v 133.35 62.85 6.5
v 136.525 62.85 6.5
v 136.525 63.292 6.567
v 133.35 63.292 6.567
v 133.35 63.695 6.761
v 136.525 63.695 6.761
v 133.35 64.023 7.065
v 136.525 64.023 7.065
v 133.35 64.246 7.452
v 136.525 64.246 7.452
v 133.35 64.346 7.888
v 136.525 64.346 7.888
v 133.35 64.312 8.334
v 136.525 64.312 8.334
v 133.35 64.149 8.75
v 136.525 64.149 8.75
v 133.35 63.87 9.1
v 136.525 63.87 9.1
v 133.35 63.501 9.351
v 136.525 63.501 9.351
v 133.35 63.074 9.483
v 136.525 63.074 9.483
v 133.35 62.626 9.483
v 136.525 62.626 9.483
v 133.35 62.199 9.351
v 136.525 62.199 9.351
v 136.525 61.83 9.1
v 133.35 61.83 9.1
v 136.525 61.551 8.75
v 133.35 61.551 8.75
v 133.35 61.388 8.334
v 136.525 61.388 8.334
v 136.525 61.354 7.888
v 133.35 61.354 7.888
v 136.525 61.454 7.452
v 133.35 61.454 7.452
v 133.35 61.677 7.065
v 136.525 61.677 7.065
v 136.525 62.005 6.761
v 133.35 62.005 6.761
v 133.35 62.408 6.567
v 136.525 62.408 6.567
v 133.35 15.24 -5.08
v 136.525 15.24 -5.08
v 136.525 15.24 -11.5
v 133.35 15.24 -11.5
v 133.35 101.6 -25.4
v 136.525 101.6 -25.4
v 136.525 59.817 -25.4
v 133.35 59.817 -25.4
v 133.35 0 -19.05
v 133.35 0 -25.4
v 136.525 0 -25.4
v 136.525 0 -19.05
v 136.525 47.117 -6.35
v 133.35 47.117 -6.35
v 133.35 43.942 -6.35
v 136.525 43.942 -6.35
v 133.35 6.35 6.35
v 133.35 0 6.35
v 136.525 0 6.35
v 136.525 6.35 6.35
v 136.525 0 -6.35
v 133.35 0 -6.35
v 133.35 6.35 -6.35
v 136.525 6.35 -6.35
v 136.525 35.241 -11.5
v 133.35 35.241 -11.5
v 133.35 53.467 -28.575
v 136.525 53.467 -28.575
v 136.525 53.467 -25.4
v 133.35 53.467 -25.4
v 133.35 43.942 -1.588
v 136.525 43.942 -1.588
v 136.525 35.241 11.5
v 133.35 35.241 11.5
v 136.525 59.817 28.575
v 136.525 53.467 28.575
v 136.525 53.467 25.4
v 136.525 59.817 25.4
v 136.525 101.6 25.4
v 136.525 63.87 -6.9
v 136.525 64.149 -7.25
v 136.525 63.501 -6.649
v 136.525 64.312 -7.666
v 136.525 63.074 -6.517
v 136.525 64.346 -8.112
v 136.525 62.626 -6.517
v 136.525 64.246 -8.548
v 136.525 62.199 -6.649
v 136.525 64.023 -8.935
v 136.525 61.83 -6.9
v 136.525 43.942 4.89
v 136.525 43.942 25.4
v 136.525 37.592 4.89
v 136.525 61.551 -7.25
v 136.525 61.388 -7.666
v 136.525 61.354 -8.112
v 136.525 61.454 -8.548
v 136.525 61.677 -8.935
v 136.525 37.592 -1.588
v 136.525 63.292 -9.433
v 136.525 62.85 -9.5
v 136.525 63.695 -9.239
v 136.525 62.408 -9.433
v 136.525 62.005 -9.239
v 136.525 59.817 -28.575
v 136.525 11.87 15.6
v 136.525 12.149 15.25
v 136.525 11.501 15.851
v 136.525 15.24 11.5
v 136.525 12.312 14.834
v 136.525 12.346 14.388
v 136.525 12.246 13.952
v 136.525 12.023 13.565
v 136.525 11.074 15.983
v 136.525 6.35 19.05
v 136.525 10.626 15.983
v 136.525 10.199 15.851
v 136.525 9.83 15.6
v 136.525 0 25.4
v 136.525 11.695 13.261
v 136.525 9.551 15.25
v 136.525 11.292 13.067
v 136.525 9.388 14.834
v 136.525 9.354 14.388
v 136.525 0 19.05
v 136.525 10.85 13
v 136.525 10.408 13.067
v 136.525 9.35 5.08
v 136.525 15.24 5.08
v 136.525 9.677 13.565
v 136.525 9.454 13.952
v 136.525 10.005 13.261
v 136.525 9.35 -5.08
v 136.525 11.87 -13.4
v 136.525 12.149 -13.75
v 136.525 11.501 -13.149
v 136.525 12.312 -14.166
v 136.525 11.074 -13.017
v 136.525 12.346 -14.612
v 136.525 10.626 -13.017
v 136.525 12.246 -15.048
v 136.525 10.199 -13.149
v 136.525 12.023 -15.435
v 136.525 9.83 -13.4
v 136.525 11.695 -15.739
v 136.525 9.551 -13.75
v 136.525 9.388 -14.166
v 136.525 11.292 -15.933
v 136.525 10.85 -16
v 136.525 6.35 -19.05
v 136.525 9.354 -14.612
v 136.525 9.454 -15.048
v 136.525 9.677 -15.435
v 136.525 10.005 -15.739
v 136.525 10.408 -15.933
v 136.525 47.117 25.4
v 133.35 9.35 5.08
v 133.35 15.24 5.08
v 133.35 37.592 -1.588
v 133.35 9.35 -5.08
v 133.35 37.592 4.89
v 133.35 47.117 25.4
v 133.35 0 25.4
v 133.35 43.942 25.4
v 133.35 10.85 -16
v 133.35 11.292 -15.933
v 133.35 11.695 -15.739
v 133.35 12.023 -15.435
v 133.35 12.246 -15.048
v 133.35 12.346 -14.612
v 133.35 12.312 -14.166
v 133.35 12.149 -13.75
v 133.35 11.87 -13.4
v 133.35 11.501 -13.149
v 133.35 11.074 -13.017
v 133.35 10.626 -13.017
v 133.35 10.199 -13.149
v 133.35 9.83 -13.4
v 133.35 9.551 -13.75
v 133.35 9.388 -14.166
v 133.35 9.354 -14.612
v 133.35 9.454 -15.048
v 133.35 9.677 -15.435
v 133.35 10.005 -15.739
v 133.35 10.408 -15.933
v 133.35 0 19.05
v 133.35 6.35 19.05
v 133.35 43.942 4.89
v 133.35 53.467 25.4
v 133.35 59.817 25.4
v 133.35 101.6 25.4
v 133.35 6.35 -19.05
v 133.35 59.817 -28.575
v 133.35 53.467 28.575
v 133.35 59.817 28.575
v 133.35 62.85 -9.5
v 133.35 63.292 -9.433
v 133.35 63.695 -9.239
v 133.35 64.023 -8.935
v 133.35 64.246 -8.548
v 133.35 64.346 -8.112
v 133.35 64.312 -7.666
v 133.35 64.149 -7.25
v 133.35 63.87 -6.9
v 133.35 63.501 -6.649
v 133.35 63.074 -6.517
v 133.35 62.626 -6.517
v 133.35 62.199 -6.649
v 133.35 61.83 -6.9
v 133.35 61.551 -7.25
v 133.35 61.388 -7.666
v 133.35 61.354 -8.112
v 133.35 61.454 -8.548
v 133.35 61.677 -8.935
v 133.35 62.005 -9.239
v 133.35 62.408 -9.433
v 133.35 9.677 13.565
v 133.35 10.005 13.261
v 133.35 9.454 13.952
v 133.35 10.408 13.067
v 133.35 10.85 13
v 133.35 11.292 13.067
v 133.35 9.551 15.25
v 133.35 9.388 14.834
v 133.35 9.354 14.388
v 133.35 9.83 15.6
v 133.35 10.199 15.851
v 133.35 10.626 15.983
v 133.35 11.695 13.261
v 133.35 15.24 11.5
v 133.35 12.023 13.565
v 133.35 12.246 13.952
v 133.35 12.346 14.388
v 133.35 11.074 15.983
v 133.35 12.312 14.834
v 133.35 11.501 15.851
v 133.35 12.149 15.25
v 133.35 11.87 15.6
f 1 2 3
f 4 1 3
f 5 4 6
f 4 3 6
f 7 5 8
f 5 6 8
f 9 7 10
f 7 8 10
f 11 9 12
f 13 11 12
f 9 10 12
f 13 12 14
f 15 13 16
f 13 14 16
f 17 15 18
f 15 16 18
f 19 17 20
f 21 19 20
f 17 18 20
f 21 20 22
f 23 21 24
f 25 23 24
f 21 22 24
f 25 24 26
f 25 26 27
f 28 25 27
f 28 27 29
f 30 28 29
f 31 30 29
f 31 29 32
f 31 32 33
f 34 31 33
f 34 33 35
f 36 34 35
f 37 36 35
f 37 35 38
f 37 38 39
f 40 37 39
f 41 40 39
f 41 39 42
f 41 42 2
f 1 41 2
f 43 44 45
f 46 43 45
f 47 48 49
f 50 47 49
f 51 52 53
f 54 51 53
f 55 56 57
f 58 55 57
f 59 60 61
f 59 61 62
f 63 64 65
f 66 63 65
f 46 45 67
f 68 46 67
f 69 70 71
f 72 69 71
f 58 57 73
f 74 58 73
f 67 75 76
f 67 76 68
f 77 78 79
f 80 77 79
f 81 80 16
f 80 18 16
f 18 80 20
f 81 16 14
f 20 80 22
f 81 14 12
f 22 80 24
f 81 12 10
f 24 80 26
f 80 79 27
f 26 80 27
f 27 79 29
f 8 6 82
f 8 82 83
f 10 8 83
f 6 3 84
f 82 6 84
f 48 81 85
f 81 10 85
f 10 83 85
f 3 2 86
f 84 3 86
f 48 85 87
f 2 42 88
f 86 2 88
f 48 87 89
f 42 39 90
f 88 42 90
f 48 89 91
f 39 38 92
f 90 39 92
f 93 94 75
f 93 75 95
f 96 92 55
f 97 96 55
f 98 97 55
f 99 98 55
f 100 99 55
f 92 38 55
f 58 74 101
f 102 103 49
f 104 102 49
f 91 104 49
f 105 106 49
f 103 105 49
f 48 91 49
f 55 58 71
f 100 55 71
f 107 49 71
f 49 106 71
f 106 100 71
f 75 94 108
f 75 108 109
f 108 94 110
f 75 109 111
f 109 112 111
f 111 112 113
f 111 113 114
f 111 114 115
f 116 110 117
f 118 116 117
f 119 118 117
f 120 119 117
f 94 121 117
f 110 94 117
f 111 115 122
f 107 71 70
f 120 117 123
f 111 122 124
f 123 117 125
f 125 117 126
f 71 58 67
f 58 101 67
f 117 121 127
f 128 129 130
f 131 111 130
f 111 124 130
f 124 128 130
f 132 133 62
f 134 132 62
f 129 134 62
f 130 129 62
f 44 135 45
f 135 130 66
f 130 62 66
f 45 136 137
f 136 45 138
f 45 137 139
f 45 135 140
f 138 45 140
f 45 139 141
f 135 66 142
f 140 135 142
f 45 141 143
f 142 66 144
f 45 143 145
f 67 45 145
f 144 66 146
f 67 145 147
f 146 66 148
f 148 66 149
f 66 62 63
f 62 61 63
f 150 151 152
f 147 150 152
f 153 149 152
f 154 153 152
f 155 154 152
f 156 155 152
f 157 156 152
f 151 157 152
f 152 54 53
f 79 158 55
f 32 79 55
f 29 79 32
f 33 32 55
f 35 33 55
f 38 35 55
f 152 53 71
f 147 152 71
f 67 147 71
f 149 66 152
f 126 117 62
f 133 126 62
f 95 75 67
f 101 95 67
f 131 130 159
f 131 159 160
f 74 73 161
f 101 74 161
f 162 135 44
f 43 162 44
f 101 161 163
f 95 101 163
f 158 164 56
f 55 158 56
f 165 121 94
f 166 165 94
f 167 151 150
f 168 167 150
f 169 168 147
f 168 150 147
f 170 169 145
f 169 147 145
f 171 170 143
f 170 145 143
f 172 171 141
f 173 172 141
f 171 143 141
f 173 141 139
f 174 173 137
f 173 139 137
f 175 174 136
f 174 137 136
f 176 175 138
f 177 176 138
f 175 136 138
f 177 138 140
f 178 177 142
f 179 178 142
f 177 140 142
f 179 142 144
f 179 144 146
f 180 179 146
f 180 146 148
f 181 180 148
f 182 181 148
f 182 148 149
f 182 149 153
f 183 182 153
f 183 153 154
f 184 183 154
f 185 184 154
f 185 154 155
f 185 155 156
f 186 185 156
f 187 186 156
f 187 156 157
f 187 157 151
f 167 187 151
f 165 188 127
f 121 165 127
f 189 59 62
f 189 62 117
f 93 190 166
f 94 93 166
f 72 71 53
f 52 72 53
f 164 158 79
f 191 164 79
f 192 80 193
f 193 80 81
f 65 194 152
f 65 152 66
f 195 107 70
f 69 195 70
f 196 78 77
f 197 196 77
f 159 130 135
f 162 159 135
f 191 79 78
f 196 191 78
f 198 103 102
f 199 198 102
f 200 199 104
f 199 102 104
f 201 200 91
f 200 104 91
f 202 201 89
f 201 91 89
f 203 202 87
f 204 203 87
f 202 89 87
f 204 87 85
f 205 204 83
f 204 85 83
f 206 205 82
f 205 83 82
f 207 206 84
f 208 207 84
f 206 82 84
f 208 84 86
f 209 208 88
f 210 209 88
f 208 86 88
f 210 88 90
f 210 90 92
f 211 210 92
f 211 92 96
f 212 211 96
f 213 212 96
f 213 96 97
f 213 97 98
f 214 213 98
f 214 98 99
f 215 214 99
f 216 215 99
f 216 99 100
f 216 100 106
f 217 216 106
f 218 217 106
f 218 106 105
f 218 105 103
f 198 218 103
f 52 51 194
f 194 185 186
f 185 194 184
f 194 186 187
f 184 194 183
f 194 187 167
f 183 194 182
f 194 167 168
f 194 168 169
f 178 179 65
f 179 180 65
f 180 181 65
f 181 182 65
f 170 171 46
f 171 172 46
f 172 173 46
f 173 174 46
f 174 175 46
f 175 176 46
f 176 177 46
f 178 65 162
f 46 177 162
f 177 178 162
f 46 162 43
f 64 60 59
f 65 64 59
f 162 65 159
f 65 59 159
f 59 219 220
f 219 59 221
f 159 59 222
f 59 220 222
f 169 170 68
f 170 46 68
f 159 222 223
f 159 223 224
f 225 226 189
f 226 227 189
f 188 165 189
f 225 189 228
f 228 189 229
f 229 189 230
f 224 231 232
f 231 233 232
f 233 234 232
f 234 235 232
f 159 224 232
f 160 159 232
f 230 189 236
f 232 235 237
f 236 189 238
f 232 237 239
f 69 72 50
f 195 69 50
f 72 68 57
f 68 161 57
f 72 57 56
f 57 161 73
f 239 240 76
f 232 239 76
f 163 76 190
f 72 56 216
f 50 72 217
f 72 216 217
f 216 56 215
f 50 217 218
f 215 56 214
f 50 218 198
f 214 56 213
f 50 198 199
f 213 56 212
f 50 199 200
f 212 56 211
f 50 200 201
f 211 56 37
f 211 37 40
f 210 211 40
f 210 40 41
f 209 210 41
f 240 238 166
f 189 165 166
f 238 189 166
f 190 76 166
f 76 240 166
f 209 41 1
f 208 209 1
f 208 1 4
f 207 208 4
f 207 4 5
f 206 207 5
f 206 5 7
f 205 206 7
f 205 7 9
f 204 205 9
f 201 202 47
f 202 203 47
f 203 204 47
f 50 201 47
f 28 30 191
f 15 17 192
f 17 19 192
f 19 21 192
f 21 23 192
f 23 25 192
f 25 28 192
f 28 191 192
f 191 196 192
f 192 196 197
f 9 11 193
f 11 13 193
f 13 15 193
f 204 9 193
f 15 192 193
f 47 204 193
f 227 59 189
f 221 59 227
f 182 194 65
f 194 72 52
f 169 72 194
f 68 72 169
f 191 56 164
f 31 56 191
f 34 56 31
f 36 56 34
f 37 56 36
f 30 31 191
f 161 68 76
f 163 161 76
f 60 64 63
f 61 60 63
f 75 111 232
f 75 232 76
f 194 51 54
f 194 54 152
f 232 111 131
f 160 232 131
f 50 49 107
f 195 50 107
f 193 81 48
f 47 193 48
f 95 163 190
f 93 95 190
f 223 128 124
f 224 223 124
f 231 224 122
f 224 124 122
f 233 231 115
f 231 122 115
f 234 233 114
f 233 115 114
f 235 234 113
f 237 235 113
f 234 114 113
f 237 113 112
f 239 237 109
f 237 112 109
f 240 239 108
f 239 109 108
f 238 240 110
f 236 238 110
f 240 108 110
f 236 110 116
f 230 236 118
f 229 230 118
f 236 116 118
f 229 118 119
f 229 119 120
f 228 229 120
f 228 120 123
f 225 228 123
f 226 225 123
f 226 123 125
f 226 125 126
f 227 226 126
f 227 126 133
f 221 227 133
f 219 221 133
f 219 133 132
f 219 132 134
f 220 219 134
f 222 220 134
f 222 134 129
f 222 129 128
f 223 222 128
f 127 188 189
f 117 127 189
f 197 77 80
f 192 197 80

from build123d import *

# Parameters (mm, degrees)
SKETCH1_W              = 273.05
SKETCH1_H              = 139.7
BOSS_EXTRUDE1_DEPTH    = 6.35
SKETCH2_W              = 273.05
SKETCH2_H              = 139.7
SKETCH2_W_2            = 266.7
SKETCH2_H_2            = 133.35
BOSS_EXTRUDE2_DEPTH    = 298.45
SKETCH3_W              = 6.35
SKETCH3_H              = 16.933333333
SKETCH3_H_2            = 16.933333334
DOOR_SLOT_DEPTH        = 12.7
DOOR_GUIDE_HOLES_REACH = 362.806
SKETCH4_W              = 6.35
SKETCH4_H              = 15.875
LEVER_HOLES_W          = 9.652
LEVER_HOLES_H          = 6.35
LEVER_HOLES_W_2        = 6.35
CUT_EXTRUDE1_DEPTH     = 363.019620497
CUT_EXTRUDE3_REACH     = 417.137
SKETCH8_R              = 3.175
SKETCH16_W             = 329.651778096
SKETCH16_H             = 315.233565403
CUT_EXTRUDE10_DEPTH    = 363.019620497
LEFT_RIGHT_W           = 9.525
LEFT_RIGHT_H           = 6.35
LEFT_RIGHT_W_2         = 12.7
LEFT_RIGHT_W_3         = 3.175
LEFT_RIGHT_H_2         = 12.7
CUT_EXTRUDE11_DEPTH    = 416.136561869
SKETCH17_W             = 23
SKETCH17_H             = 20.0007988
SKETCH17_W_2           = 10.16
SKETCH17_H_2           = 5.89
SKETCH17_R             = 1.5
CUT_EXTRUDE12_DEPTH    = 313.717353412
CUT_EXTRUDE13_DEPTH    = 313.717353412
CUT_EXTRUDE14_DEPTH    = 106.589636092


with BuildPart() as part:
    # Sketch1 → Boss-Extrude1 (new body)
    with BuildSketch(Plane(origin=(0, 0, 0), x_dir=(1, 0, 0), z_dir=(0, 1, 0))):
        Rectangle(SKETCH1_W, SKETCH1_H)
    extrude(amount=BOSS_EXTRUDE1_DEPTH)

    # Sketch2 → Boss-Extrude2 (add)
    with BuildSketch(Plane(origin=(0, 6.35, 0), x_dir=(1, 0, 0), z_dir=(0, 1, 0))):
        Rectangle(SKETCH2_W, SKETCH2_H)
        Rectangle(SKETCH2_W_2, SKETCH2_H_2, mode=Mode.SUBTRACT)
    extrude(amount=BOSS_EXTRUDE2_DEPTH)

    # Sketch3 → Door Slot (cut)
    with BuildSketch(Plane.XY.offset(69.85)):
        with BuildLine():
            Line((-31.75, 283.21), (-31.75, 6.35))
            Line((-31.75, 6.35), (-25.146, 6.35))
            Line((-25.146, 6.35), (-25.146, 292.354))
            Line((-25.146, 292.354), (-44.704, 292.354))
            Line((-44.704, 292.354), (-44.704, 285.75))
            Line((-44.704, 285.75), (-34.29, 285.75))
            ThreePointArc((-34.29, 285.75), (-32.493948776, 285.006051224), (-31.75, 283.21))
        make_face()
        with Locations((-15.621, 80.433333334)):
            Rectangle(SKETCH3_W, SKETCH3_H)
        with Locations((-15.621, 50.8)):
            Rectangle(SKETCH3_W, SKETCH3_H_2)
        with Locations((-15.621, 21.166666667)):
            Rectangle(SKETCH3_W, SKETCH3_H)
    extrude(amount=-DOOR_SLOT_DEPTH, mode=Mode.SUBTRACT)

    # Sketch4 → Door Guide Holes (cut, up to next)
    with BuildSketch(Plane.XY.offset(-66.675), mode=Mode.PRIVATE) as door_guide_holes_sk1:
        with Locations((-47.879, 284.1625)):
            Rectangle(SKETCH4_W, SKETCH4_H)
    door_guide_holes_tool1 = extrude(door_guide_holes_sk1.sketch, amount=-DOOR_GUIDE_HOLES_REACH, mode=Mode.PRIVATE) & part.part
    # Sketch4 → Door Guide Holes (cut, up to next)
    with BuildSketch(Plane.XY.offset(-66.675), mode=Mode.PRIVATE) as door_guide_holes_sk2:
        with Locations((-47.879, 255.5875)):
            Rectangle(SKETCH4_W, SKETCH4_H)
    door_guide_holes_tool2 = extrude(door_guide_holes_sk2.sketch, amount=-DOOR_GUIDE_HOLES_REACH, mode=Mode.PRIVATE) & part.part
    # Sketch4 → Door Guide Holes (cut, up to next)
    with BuildSketch(Plane.XY.offset(-66.675), mode=Mode.PRIVATE) as door_guide_holes_sk3:
        with Locations((-47.879, 227.0125)):
            Rectangle(SKETCH4_W, SKETCH4_H)
    door_guide_holes_tool3 = extrude(door_guide_holes_sk3.sketch, amount=-DOOR_GUIDE_HOLES_REACH, mode=Mode.PRIVATE) & part.part
    # Sketch4 → Door Guide Holes (cut, up to next)
    with BuildSketch(Plane.XY.offset(-66.675), mode=Mode.PRIVATE) as door_guide_holes_sk4:
        with Locations((-47.879, 198.4375)):
            Rectangle(SKETCH4_W, SKETCH4_H)
    door_guide_holes_tool4 = extrude(door_guide_holes_sk4.sketch, amount=-DOOR_GUIDE_HOLES_REACH, mode=Mode.PRIVATE) & part.part
    # Sketch4 → Door Guide Holes (cut, up to next)
    with BuildSketch(Plane.XY.offset(-66.675), mode=Mode.PRIVATE) as door_guide_holes_sk5:
        with Locations((-47.879, 169.8625)):
            Rectangle(SKETCH4_W, SKETCH4_H)
    door_guide_holes_tool5 = extrude(door_guide_holes_sk5.sketch, amount=-DOOR_GUIDE_HOLES_REACH, mode=Mode.PRIVATE) & part.part
    # Sketch4 → Door Guide Holes (cut, up to next)
    with BuildSketch(Plane.XY.offset(-66.675), mode=Mode.PRIVATE) as door_guide_holes_sk6:
        with Locations((-47.879, 141.2875)):
            Rectangle(SKETCH4_W, SKETCH4_H)
    door_guide_holes_tool6 = extrude(door_guide_holes_sk6.sketch, amount=-DOOR_GUIDE_HOLES_REACH, mode=Mode.PRIVATE) & part.part
    # Sketch4 → Door Guide Holes (cut, up to next)
    with BuildSketch(Plane.XY.offset(-66.675), mode=Mode.PRIVATE) as door_guide_holes_sk7:
        with Locations((-47.879, 112.7125)):
            Rectangle(SKETCH4_W, SKETCH4_H)
    door_guide_holes_tool7 = extrude(door_guide_holes_sk7.sketch, amount=-DOOR_GUIDE_HOLES_REACH, mode=Mode.PRIVATE) & part.part
    # Sketch4 → Door Guide Holes (cut, up to next)
    with BuildSketch(Plane.XY.offset(-66.675), mode=Mode.PRIVATE) as door_guide_holes_sk8:
        with Locations((-47.879, 84.1375)):
            Rectangle(SKETCH4_W, SKETCH4_H)
    door_guide_holes_tool8 = extrude(door_guide_holes_sk8.sketch, amount=-DOOR_GUIDE_HOLES_REACH, mode=Mode.PRIVATE) & part.part
    # Sketch4 → Door Guide Holes (cut, up to next)
    with BuildSketch(Plane.XY.offset(-66.675), mode=Mode.PRIVATE) as door_guide_holes_sk9:
        with Locations((-47.879, 55.5625)):
            Rectangle(SKETCH4_W, SKETCH4_H)
    door_guide_holes_tool9 = extrude(door_guide_holes_sk9.sketch, amount=-DOOR_GUIDE_HOLES_REACH, mode=Mode.PRIVATE) & part.part
    # Sketch4 → Door Guide Holes (cut, up to next)
    with BuildSketch(Plane.XY.offset(-66.675), mode=Mode.PRIVATE) as door_guide_holes_sk10:
        with Locations((-47.879, 26.9875)):
            Rectangle(SKETCH4_W, SKETCH4_H)
    door_guide_holes_tool10 = extrude(door_guide_holes_sk10.sketch, amount=-DOOR_GUIDE_HOLES_REACH, mode=Mode.PRIVATE) & part.part
    door_guide_holes_1 = door_guide_holes_tool1.solids().sort_by_distance((-47.879, 284.1625, -66.675))[0]
    add(door_guide_holes_1, mode=Mode.SUBTRACT)
    door_guide_holes_2 = door_guide_holes_tool2.solids().sort_by_distance((-47.879, 255.5875, -66.675))[0]
    add(door_guide_holes_2, mode=Mode.SUBTRACT)
    door_guide_holes_3 = door_guide_holes_tool3.solids().sort_by_distance((-47.879, 227.0125, -66.675))[0]
    add(door_guide_holes_3, mode=Mode.SUBTRACT)
    door_guide_holes_4 = door_guide_holes_tool4.solids().sort_by_distance((-47.879, 198.4375, -66.675))[0]
    add(door_guide_holes_4, mode=Mode.SUBTRACT)
    door_guide_holes_5 = door_guide_holes_tool5.solids().sort_by_distance((-47.879, 169.8625, -66.675))[0]
    add(door_guide_holes_5, mode=Mode.SUBTRACT)
    door_guide_holes_6 = door_guide_holes_tool6.solids().sort_by_distance((-47.879, 141.2875, -66.675))[0]
    add(door_guide_holes_6, mode=Mode.SUBTRACT)
    door_guide_holes_7 = door_guide_holes_tool7.solids().sort_by_distance((-47.879, 112.7125, -66.675))[0]
    add(door_guide_holes_7, mode=Mode.SUBTRACT)
    door_guide_holes_8 = door_guide_holes_tool8.solids().sort_by_distance((-47.879, 84.1375, -66.675))[0]
    add(door_guide_holes_8, mode=Mode.SUBTRACT)
    door_guide_holes_9 = door_guide_holes_tool9.solids().sort_by_distance((-47.879, 55.5625, -66.675))[0]
    add(door_guide_holes_9, mode=Mode.SUBTRACT)
    door_guide_holes_10 = door_guide_holes_tool10.solids().sort_by_distance((-47.879, 26.9875, -66.675))[0]
    add(door_guide_holes_10, mode=Mode.SUBTRACT)
    door_guide_holes = door_guide_holes_1 + door_guide_holes_2 + door_guide_holes_3 + door_guide_holes_4 + door_guide_holes_5 + door_guide_holes_6 + door_guide_holes_7 + door_guide_holes_8 + door_guide_holes_9 + door_guide_holes_10  # Door Guide Holes as one shape, for the pattern or mirror that repeats it

    # Mirror1: Door Guide Holes across plane
    add(door_guide_holes.mirror(Plane.ZY.offset(34.925)), mode=Mode.SUBTRACT)

    # Lever Holes → Cut-Extrude1 (cut, through all)
    with BuildSketch(Plane.XY.offset(69.85)):
        with Locations((54.102, 28.575)):
            Rectangle(LEVER_HOLES_W, LEVER_HOLES_H)
        with Locations((39.3065, 15.875)):
            Rectangle(LEVER_HOLES_W_2, LEVER_HOLES_H)
        with Locations((68.8975, 15.875)):
            Rectangle(LEVER_HOLES_W_2, LEVER_HOLES_H)
    extrude(amount=-CUT_EXTRUDE1_DEPTH, mode=Mode.SUBTRACT)

    # Sketch8 → Cut-Extrude3 (cut, up to next)
    with BuildSketch(Plane.ZY.offset(136.525), mode=Mode.PRIVATE) as cut_extrude3_sk1:
        with Locations((0, 19.05)):
            Circle(SKETCH8_R)
    cut_extrude3_tool1 = extrude(cut_extrude3_sk1.sketch, amount=-CUT_EXTRUDE3_REACH, mode=Mode.PRIVATE) & part.part
    add(cut_extrude3_tool1.solids().sort_by_distance((-136.525, 19.05, 0))[0], mode=Mode.SUBTRACT)

    # Sketch16 → Cut-Extrude10 (cut, through all)
    with BuildSketch(Plane.XY.offset(69.85)):
        with Locations((-31.475889048, 147.183217299)):
            Rectangle(SKETCH16_W, SKETCH16_H)
    extrude(amount=-CUT_EXTRUDE10_DEPTH, mode=Mode.SUBTRACT)

    # Left/Right → Cut-Extrude11 (cut, through all)
    with BuildSketch(Plane.ZY.offset(136.525)):
        with Locations((61.9125, 3.175)):
            Rectangle(LEFT_RIGHT_W, LEFT_RIGHT_H)
        with Locations((38.1, 3.175)):
            Rectangle(LEFT_RIGHT_W_2, LEFT_RIGHT_H)
        with Locations((68.2625, 19.05)):
            Rectangle(LEFT_RIGHT_W_3, LEFT_RIGHT_H_2)
        with Locations((12.7, 3.175)):
            Rectangle(LEFT_RIGHT_W_2, LEFT_RIGHT_H)
        with Locations((68.2625, 44.45)):
            Rectangle(LEFT_RIGHT_W_3, LEFT_RIGHT_H_2)
        with Locations((-12.7, 3.175)):
            Rectangle(LEFT_RIGHT_W_2, LEFT_RIGHT_H)
        with Locations((68.2625, 69.85)):
            Rectangle(LEFT_RIGHT_W_3, LEFT_RIGHT_H_2)
        with Locations((-38.1, 3.175)):
            Rectangle(LEFT_RIGHT_W_2, LEFT_RIGHT_H)
        with Locations((68.2625, 95.25)):
            Rectangle(LEFT_RIGHT_W_3, LEFT_RIGHT_H_2)
        with Locations((-61.9125, 3.175)):
            Rectangle(LEFT_RIGHT_W, LEFT_RIGHT_H)
        with Locations((68.2625, 120.65)):
            Rectangle(LEFT_RIGHT_W_3, LEFT_RIGHT_H_2)
        with Locations((-68.2625, 19.05)):
            Rectangle(LEFT_RIGHT_W_3, LEFT_RIGHT_H_2)
        with Locations((68.2625, 146.05)):
            Rectangle(LEFT_RIGHT_W_3, LEFT_RIGHT_H_2)
        with Locations((-68.2625, 44.45)):
            Rectangle(LEFT_RIGHT_W_3, LEFT_RIGHT_H_2)
        with Locations((68.2625, 171.45)):
            Rectangle(LEFT_RIGHT_W_3, LEFT_RIGHT_H_2)
        with Locations((-68.2625, 69.85)):
            Rectangle(LEFT_RIGHT_W_3, LEFT_RIGHT_H_2)
        with Locations((68.2625, 196.85)):
            Rectangle(LEFT_RIGHT_W_3, LEFT_RIGHT_H_2)
        with Locations((-68.2625, 95.25)):
            Rectangle(LEFT_RIGHT_W_3, LEFT_RIGHT_H_2)
        with Locations((68.2625, 222.25)):
            Rectangle(LEFT_RIGHT_W_3, LEFT_RIGHT_H_2)
        with Locations((-68.2625, 120.65)):
            Rectangle(LEFT_RIGHT_W_3, LEFT_RIGHT_H_2)
        with Locations((68.2625, 247.65)):
            Rectangle(LEFT_RIGHT_W_3, LEFT_RIGHT_H_2)
        with Locations((-68.2625, 146.05)):
            Rectangle(LEFT_RIGHT_W_3, LEFT_RIGHT_H_2)
        with Locations((68.2625, 273.05)):
            Rectangle(LEFT_RIGHT_W_3, LEFT_RIGHT_H_2)
        with Locations((-68.2625, 171.45)):
            Rectangle(LEFT_RIGHT_W_3, LEFT_RIGHT_H_2)
        with Locations((68.2625, 298.45)):
            Rectangle(LEFT_RIGHT_W_3, LEFT_RIGHT_H_2)
        with Locations((-68.2625, 196.85)):
            Rectangle(LEFT_RIGHT_W_3, LEFT_RIGHT_H_2)
        with Locations((-68.2625, 222.25)):
            Rectangle(LEFT_RIGHT_W_3, LEFT_RIGHT_H_2)
        with Locations((-68.2625, 247.65)):
            Rectangle(LEFT_RIGHT_W_3, LEFT_RIGHT_H_2)
        with Locations((-68.2625, 273.05)):
            Rectangle(LEFT_RIGHT_W_3, LEFT_RIGHT_H_2)
        with Locations((-68.2625, 298.45)):
            Rectangle(LEFT_RIGHT_W_3, LEFT_RIGHT_H_2)
    extrude(amount=-CUT_EXTRUDE11_DEPTH, mode=Mode.SUBTRACT)

    # Sketch17 → Cut-Extrude12 (cut, through all)
    with BuildSketch(Plane(origin=(136.525, 0, 0), x_dir=(0, 0, -1), z_dir=(1, 0, 0))):
        with Locations((0, 25.2403994)):
            Rectangle(SKETCH17_W, SKETCH17_H)
        with Locations((0, 12.295)):
            Rectangle(SKETCH17_W_2, SKETCH17_H_2)
        with Locations((14.5, 10.85)):
            Circle(SKETCH17_R)
        with Locations((-14.5, 10.85)):
            Circle(SKETCH17_R)
        with Locations((-8, 62.8499886)):
            Circle(SKETCH17_R)
        with Locations((8, 62.8499886)):
            Circle(SKETCH17_R)
    extrude(amount=-CUT_EXTRUDE12_DEPTH, mode=Mode.SUBTRACT)

    # Sketch18 → Cut-Extrude13 (cut, through all)
    with BuildSketch(Plane(origin=(136.525, 0, 0), x_dir=(0, 0, -1), z_dir=(1, 0, 0))):
        Polygon((-69.85, 304.8), (-69.85, 0), (-25.4, 0), (-25.4, 53.467), (-28.575, 53.467), (-28.575, 59.817), (-25.4, 59.817), (-25.4, 101.6), (25.4, 101.6), (25.4, 59.817), (28.575, 59.817), (28.575, 53.467), (25.4, 53.467), (25.4, 0), (69.85, 0), (69.85, 304.8), align=None)
    extrude(amount=-CUT_EXTRUDE13_DEPTH, mode=Mode.SUBTRACT)

    # Sketch19 → Cut-Extrude14 (cut, through all)
    with BuildSketch(Plane.ZY.offset(-133.35)):
        Polygon((25.4, 47.117), (-6.35, 47.117), (-6.35, 43.942), (-1.5875, 43.942), (-1.5875, 37.592), (4.8895, 37.592), (4.8895, 43.942), (25.4, 43.942), align=None)
    extrude(amount=-CUT_EXTRUDE14_DEPTH, mode=Mode.SUBTRACT)


solid = part.part
